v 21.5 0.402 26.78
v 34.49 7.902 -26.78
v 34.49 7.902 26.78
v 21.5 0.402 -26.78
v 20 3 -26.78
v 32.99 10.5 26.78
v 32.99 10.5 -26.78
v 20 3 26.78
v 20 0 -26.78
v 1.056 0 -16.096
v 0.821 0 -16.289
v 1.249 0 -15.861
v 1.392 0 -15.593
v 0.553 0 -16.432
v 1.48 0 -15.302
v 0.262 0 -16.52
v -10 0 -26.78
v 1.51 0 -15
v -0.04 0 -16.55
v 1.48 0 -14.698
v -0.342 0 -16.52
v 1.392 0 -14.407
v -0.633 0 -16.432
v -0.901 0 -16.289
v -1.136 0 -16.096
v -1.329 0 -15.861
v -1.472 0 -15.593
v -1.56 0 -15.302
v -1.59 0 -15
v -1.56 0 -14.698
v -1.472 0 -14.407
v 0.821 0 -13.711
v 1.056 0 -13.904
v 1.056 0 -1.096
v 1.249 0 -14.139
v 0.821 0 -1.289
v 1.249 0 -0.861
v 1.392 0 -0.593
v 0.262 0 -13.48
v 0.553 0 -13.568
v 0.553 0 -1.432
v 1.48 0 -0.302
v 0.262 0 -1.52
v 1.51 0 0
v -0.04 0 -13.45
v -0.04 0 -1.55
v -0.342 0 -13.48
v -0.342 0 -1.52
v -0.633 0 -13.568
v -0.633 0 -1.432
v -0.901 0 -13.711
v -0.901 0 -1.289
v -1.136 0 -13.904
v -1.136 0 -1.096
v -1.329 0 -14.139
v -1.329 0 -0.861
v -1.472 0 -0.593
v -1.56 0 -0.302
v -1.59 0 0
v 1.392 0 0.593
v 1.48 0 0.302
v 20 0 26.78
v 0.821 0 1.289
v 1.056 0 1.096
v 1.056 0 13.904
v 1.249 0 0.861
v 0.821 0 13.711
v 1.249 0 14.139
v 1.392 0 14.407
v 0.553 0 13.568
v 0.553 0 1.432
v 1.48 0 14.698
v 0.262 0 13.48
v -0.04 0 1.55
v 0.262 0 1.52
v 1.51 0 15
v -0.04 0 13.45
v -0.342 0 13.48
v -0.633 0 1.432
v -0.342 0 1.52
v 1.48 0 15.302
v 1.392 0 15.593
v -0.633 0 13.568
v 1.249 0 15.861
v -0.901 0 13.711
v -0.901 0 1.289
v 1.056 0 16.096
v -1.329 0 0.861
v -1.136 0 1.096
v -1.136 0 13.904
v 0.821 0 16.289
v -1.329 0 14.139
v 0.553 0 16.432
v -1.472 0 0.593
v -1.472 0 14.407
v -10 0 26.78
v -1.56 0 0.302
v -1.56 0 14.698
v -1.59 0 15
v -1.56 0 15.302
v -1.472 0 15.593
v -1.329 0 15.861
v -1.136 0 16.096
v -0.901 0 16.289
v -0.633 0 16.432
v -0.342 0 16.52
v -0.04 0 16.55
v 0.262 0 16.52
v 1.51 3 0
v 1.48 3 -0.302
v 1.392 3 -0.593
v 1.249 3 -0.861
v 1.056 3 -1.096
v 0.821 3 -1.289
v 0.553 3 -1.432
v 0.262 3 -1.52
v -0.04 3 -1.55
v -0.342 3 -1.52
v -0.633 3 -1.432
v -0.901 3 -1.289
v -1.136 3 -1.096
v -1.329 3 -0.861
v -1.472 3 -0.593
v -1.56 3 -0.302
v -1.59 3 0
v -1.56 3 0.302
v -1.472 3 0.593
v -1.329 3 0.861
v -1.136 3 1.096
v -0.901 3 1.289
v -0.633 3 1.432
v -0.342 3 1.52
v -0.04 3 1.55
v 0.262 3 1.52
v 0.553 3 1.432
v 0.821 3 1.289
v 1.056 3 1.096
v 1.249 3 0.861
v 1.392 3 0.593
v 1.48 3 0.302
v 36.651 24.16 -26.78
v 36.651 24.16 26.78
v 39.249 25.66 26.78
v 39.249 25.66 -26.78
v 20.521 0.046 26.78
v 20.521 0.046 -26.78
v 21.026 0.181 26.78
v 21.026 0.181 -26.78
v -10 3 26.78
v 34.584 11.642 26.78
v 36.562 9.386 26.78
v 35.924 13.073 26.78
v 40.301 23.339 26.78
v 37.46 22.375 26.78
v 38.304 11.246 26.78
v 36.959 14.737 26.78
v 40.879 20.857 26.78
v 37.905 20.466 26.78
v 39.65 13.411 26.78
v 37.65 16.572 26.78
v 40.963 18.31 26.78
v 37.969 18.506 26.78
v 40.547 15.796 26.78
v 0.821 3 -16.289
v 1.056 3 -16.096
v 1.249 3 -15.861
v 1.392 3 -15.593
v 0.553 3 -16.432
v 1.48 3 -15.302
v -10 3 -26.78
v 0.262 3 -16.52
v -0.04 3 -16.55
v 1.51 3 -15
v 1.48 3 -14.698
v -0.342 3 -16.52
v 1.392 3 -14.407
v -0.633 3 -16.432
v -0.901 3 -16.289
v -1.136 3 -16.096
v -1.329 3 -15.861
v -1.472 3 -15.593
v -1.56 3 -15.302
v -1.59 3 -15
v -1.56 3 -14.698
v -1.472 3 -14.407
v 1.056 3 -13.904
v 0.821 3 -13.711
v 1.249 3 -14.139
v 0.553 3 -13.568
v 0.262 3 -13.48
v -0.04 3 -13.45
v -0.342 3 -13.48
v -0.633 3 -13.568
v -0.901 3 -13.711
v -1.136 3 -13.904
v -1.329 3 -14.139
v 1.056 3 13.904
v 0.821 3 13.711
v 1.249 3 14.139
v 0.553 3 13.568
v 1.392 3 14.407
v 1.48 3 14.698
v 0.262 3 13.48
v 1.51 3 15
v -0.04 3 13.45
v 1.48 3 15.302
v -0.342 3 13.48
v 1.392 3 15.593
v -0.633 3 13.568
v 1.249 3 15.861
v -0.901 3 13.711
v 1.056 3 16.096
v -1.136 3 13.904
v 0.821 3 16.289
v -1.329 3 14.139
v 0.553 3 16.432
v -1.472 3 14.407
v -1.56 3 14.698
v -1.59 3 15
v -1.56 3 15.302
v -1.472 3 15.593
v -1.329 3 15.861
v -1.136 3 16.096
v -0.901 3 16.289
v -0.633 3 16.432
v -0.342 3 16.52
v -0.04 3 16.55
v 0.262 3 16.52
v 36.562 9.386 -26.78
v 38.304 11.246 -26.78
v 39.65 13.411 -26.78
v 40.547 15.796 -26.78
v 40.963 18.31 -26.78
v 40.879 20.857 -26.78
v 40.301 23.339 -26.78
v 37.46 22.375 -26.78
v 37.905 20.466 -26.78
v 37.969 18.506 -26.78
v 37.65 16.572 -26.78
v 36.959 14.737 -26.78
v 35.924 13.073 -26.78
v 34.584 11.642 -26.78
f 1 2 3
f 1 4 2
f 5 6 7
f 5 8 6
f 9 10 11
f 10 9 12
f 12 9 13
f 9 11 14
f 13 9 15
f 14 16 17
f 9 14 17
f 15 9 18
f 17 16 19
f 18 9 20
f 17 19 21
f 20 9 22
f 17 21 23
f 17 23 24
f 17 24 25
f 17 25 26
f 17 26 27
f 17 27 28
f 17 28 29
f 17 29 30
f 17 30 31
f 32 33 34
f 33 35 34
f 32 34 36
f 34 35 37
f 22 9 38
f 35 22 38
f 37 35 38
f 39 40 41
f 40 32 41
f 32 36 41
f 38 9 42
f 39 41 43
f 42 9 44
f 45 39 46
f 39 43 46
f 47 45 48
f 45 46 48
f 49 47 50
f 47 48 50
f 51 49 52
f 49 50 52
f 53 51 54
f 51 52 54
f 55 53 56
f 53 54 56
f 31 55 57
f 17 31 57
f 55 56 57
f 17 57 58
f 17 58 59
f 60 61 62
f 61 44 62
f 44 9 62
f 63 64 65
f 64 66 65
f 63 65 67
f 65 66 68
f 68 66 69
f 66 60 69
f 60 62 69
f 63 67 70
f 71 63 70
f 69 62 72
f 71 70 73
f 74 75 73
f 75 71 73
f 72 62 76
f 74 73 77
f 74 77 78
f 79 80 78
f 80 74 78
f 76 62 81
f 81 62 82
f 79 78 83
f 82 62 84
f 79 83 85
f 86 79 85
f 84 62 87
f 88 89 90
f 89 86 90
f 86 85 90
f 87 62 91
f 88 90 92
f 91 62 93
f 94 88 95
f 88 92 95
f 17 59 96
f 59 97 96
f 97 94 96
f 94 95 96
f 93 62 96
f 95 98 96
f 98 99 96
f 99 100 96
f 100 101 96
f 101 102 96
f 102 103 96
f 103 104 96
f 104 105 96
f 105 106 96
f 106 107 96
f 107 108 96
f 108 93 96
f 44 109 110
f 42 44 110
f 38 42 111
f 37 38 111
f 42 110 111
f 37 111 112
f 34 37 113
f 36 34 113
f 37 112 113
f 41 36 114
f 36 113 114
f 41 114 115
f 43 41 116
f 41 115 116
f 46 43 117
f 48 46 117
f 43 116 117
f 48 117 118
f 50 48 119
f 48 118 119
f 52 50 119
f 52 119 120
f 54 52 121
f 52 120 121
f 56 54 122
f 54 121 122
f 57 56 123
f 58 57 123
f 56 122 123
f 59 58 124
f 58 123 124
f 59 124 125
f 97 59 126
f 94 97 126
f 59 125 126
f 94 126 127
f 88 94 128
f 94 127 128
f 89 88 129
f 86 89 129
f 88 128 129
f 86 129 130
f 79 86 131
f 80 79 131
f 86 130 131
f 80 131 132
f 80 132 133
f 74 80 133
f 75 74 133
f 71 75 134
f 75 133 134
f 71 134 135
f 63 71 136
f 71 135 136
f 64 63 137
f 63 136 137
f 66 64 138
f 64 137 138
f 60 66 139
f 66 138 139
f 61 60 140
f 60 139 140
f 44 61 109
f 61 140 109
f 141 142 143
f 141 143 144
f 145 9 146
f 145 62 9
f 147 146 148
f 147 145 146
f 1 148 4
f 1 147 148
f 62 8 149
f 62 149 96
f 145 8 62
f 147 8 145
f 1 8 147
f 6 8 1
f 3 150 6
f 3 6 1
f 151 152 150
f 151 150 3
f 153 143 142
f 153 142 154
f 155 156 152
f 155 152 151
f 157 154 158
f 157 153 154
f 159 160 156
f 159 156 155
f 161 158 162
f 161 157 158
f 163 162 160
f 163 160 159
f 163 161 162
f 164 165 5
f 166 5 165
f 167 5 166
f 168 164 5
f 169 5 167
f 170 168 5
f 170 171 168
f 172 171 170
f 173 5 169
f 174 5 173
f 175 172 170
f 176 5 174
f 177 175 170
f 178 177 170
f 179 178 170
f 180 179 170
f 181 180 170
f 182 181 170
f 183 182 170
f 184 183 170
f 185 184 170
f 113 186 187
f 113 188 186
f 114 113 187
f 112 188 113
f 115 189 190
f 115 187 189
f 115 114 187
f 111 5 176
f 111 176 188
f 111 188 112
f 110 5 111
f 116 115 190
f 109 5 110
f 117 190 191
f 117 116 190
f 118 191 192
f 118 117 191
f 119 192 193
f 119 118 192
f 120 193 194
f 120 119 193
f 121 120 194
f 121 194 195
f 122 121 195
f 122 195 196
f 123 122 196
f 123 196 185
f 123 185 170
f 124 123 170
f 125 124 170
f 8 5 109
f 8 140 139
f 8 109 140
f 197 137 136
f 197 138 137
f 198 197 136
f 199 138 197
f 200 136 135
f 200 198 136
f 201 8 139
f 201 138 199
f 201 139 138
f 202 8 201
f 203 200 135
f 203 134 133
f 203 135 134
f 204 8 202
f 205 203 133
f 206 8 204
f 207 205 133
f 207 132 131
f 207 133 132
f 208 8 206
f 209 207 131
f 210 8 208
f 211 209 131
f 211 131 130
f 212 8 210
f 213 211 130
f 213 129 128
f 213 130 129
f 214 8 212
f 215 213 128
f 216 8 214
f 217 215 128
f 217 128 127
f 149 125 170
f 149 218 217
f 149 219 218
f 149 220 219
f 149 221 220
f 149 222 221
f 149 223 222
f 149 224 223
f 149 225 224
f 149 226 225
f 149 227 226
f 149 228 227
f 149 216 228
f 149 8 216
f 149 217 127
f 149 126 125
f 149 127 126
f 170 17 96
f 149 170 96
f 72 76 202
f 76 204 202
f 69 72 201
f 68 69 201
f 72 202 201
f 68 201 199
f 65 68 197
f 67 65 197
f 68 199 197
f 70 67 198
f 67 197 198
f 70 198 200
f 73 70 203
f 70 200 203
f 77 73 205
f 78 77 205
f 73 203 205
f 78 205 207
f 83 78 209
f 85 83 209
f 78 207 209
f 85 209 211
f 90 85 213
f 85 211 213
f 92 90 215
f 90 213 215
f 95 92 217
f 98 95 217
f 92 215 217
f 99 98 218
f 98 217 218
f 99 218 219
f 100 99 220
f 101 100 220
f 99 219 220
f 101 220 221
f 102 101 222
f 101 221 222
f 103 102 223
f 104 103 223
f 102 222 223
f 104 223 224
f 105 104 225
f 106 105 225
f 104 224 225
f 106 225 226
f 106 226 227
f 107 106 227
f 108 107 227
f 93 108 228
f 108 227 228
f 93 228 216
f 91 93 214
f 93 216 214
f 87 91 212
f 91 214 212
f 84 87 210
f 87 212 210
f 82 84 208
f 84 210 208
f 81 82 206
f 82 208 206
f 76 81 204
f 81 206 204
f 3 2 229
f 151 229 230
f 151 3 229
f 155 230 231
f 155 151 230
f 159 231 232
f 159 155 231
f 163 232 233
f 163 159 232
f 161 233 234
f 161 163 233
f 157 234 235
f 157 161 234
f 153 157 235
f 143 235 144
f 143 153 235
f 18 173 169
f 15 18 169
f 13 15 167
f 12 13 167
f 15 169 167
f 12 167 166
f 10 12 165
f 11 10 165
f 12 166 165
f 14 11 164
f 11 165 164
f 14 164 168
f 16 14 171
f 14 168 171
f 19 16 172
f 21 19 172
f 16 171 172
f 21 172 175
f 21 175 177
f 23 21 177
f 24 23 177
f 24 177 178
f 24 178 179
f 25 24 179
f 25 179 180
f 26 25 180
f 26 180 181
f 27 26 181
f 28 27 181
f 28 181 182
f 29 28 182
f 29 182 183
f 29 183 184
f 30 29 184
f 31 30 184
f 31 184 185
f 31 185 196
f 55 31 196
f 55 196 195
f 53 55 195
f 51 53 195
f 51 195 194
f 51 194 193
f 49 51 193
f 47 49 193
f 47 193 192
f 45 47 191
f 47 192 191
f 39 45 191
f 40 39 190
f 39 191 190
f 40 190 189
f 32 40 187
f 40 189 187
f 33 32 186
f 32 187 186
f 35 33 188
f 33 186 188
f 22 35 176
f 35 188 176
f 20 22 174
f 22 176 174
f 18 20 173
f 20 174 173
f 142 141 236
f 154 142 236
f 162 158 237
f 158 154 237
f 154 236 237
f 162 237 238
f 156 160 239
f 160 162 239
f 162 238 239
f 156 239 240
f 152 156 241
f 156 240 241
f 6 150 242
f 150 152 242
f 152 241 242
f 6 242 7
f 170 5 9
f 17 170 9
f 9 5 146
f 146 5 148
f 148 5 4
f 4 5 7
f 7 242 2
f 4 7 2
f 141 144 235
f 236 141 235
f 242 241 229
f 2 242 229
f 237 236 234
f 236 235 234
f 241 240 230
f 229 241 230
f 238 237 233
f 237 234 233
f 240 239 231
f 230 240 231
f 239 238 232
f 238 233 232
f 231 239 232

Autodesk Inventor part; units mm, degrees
ref_plane "YZ Plane" through (0, 0, 0) normal (1, 0, 0) x (0, 1, 0)
ref_plane "XZ Plane" through (0, 0, 0) normal (0, 1, 0) x (-1, 0, 0)
ref_plane "XY Plane" through (0, 0, 0) normal (0, 0, 1) x (1, 0, 0)
sketch "Sketch1" plane through (0, 0, 0) normal (0, 1, 0) x (-1, 0, 0)
  line L0 (10, 26.78) -> (-20, 26.78)
  line L1 (-20, 26.78) -> (-20, -26.78)
  line L2 (-20, -26.78) -> (10, -26.78)
  line L3 (10, -26.78) -> (10, 26.78)
  point P0 (0, 0)
  dimension "d0" = 53.56
  dimension "d1" = 30
  dimension "d2" = 10
  dimension "d3" = 26.78
extrude "Extrusion1" add sketch "Sketch1" along normal blind 3
sketch "Sketch2" plane through (0, 3, 0) normal (0, 1, 0) x (1, 0, 0)
  circle A0 centre (-0.04, 0) radius 1.55
  line L0 (20, -26.78) -> (20, 26.78) projected
  circle A1 centre (-0.04, -15) radius 1.55
  circle A2 centre (-0.04, 15) radius 1.55
  point P0 (0, 0)
  point P1 (20, 0)
  dimension "d6" = 3.1
  dimension "d7" = 20.04
  dimension "d8" = 0
  dimension "d9" = 3.1
  dimension "d10" = 20.04
  dimension "d11" = 15
  dimension "d12" = 3.1
  dimension "d13" = 20.04
  dimension "d14" = 15
extrude "Extrusion2" cut sketch "Sketch2" against normal blind 3
sketch "Sketch3" plane through (0, 3, 0) normal (0, 1, 0) x (1, 0, 0)
  point P0 (0, 0)
sketch "Sketch4" plane through (20, 0, 26.78) normal (1, 0, 0) x (0, 0, -1)
  line L0 (0, 3) -> (53.56, 3)
  line L1 (53.56, 3) -> (53.56, 0)
  line L2 (53.56, 0) -> (0, 0)
  line L3 (0, 0) -> (0, 3)
  line L4 (0, 3) -> (53.56, 3) projected
  line L5 (0, 0) -> (0, 3) projected
  point P0 (26.78, 0)
  dimension "d17" = 3
  dimension "d18" = 53.56
  dimension "d19" = 0
  dimension "d20" = 0
revolve "Revolution2" add sketch "Sketch4" angle 30 about axis through (20, 3, 26.78) along (0, 0, 1)
sketch "Sketch6" plane through (20, 3, 26.78) normal (0.8660254, 0.5, 0) x (0, 0, -1)
  line L0 (0, 0) -> (53.56, 0)
  line L1 (53.56, 0) -> (53.56, -3)
  line L2 (53.56, -3) -> (0, -3)
  line L3 (0, -3) -> (0, 0)
  line L4 (0, 0) -> (53.56, 0) projected
  line L5 (0, 0) -> (0, -3) projected
  point P0 (26.78, 7.4019)
  dimension "d26" = 53.56
  dimension "d27" = 3
  dimension "d28" = 0
  dimension "d29" = 0
extrude "Extrusion3" add sketch "Sketch6" along normal blind 15
sketch "Sketch7" plane through (32.9904, 10.5, 26.78) normal (0.8660254, 0.5, 0) x (0, 0, -1)
  line L0 (0, 0) -> (53.56, 0)
  line L1 (53.56, 0) -> (53.56, -3)
  line L2 (53.56, -3) -> (0, -3)
  line L3 (0, -3) -> (0, 0)
  line L4 (0, -3) -> (53.56, -3) projected
  line L5 (0, 0) -> (0, -3) projected
  point P0 (26.78, 7.4019)
  dimension "d32" = 53.56
  dimension "d33" = 3
  dimension "d34" = 0
  dimension "d35" = 0
sketch "Sketch8" plane through (32.9904, 10.5, 26.78) normal (0.8660254, 0.5, 0) x (0, 0, -1)
  line L0 (-5.6464, 10) -> (58.6102, 10)
  line L1 (58.6102, 10) -> (58.6102, -7.2897)
  line L2 (58.6102, -7.2897) -> (-5.6464, -7.2897)
  line L3 (-5.6464, -7.2897) -> (-5.6464, 10)
  line L4 (53.56, 0) -> (0, 0) projected
  line L5 (53.56, -3) -> (53.56, 0) projected
  point P0 (26.78, 7.4019)
  dimension "d38" = 64.2566
  dimension "d39" = 17.2897
  dimension "d40" = 10
  dimension "d41" = 5.0502
revolve "Revolution4" add sketch "Sketch7" angle 90 about axis through (27.9904, 19.1603, 32.4264) along (0, 0, 1)
properties part number "gripper_frame"
